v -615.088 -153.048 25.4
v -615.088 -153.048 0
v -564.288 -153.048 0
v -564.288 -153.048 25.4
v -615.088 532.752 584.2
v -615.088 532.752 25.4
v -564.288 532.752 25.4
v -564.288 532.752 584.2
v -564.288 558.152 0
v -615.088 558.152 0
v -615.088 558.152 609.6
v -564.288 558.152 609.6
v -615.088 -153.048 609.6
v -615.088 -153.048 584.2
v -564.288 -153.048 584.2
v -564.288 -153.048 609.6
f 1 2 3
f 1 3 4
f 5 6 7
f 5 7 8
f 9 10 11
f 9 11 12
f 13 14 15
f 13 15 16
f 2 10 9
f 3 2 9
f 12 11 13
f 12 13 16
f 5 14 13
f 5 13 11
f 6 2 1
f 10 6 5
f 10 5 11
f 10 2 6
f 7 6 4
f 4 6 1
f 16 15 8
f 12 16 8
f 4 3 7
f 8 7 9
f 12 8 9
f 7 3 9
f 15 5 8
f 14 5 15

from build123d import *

# Parameters (mm, degrees)
F0_W     = 50.8
F0_H     = 736.6
F1_DEPTH = 609.6
F2_W     = 685.8
F2_H     = 558.8
F3_DEPTH = 50.8
F4_W     = 25.4
F4_H     = 609.6
F5_DEPTH = 50.8


with BuildPart() as f1:
    # F0 (on Top) → F1 (new body)
    with BuildSketch(Plane.XY):
        with Locations((-589.687777, 189.852441)):
            Rectangle(F0_W, F0_H)
    extrude(amount=F1_DEPTH)

    # F2 (on face) → F3 (cut)
    with BuildSketch(Plane(origin=(-615.087777, 0, 0), x_dir=(0, -1, 0), z_dir=(-1, 0, 0))):
        with Locations((-189.852441, 304.8)):
            Rectangle(F2_W, F2_H)
    extrude(amount=-F3_DEPTH, mode=Mode.SUBTRACT)

    # F4 (on face) → F5 (cut)
    with BuildSketch(Plane(origin=(-615.087777, 0, 0), x_dir=(0, -1, 0), z_dir=(-1, 0, 0))):
        with Locations((165.747559, 304.8)):
            Rectangle(F4_W, F4_H)
    extrude(amount=-F5_DEPTH, mode=Mode.SUBTRACT)


solid = f1.part
